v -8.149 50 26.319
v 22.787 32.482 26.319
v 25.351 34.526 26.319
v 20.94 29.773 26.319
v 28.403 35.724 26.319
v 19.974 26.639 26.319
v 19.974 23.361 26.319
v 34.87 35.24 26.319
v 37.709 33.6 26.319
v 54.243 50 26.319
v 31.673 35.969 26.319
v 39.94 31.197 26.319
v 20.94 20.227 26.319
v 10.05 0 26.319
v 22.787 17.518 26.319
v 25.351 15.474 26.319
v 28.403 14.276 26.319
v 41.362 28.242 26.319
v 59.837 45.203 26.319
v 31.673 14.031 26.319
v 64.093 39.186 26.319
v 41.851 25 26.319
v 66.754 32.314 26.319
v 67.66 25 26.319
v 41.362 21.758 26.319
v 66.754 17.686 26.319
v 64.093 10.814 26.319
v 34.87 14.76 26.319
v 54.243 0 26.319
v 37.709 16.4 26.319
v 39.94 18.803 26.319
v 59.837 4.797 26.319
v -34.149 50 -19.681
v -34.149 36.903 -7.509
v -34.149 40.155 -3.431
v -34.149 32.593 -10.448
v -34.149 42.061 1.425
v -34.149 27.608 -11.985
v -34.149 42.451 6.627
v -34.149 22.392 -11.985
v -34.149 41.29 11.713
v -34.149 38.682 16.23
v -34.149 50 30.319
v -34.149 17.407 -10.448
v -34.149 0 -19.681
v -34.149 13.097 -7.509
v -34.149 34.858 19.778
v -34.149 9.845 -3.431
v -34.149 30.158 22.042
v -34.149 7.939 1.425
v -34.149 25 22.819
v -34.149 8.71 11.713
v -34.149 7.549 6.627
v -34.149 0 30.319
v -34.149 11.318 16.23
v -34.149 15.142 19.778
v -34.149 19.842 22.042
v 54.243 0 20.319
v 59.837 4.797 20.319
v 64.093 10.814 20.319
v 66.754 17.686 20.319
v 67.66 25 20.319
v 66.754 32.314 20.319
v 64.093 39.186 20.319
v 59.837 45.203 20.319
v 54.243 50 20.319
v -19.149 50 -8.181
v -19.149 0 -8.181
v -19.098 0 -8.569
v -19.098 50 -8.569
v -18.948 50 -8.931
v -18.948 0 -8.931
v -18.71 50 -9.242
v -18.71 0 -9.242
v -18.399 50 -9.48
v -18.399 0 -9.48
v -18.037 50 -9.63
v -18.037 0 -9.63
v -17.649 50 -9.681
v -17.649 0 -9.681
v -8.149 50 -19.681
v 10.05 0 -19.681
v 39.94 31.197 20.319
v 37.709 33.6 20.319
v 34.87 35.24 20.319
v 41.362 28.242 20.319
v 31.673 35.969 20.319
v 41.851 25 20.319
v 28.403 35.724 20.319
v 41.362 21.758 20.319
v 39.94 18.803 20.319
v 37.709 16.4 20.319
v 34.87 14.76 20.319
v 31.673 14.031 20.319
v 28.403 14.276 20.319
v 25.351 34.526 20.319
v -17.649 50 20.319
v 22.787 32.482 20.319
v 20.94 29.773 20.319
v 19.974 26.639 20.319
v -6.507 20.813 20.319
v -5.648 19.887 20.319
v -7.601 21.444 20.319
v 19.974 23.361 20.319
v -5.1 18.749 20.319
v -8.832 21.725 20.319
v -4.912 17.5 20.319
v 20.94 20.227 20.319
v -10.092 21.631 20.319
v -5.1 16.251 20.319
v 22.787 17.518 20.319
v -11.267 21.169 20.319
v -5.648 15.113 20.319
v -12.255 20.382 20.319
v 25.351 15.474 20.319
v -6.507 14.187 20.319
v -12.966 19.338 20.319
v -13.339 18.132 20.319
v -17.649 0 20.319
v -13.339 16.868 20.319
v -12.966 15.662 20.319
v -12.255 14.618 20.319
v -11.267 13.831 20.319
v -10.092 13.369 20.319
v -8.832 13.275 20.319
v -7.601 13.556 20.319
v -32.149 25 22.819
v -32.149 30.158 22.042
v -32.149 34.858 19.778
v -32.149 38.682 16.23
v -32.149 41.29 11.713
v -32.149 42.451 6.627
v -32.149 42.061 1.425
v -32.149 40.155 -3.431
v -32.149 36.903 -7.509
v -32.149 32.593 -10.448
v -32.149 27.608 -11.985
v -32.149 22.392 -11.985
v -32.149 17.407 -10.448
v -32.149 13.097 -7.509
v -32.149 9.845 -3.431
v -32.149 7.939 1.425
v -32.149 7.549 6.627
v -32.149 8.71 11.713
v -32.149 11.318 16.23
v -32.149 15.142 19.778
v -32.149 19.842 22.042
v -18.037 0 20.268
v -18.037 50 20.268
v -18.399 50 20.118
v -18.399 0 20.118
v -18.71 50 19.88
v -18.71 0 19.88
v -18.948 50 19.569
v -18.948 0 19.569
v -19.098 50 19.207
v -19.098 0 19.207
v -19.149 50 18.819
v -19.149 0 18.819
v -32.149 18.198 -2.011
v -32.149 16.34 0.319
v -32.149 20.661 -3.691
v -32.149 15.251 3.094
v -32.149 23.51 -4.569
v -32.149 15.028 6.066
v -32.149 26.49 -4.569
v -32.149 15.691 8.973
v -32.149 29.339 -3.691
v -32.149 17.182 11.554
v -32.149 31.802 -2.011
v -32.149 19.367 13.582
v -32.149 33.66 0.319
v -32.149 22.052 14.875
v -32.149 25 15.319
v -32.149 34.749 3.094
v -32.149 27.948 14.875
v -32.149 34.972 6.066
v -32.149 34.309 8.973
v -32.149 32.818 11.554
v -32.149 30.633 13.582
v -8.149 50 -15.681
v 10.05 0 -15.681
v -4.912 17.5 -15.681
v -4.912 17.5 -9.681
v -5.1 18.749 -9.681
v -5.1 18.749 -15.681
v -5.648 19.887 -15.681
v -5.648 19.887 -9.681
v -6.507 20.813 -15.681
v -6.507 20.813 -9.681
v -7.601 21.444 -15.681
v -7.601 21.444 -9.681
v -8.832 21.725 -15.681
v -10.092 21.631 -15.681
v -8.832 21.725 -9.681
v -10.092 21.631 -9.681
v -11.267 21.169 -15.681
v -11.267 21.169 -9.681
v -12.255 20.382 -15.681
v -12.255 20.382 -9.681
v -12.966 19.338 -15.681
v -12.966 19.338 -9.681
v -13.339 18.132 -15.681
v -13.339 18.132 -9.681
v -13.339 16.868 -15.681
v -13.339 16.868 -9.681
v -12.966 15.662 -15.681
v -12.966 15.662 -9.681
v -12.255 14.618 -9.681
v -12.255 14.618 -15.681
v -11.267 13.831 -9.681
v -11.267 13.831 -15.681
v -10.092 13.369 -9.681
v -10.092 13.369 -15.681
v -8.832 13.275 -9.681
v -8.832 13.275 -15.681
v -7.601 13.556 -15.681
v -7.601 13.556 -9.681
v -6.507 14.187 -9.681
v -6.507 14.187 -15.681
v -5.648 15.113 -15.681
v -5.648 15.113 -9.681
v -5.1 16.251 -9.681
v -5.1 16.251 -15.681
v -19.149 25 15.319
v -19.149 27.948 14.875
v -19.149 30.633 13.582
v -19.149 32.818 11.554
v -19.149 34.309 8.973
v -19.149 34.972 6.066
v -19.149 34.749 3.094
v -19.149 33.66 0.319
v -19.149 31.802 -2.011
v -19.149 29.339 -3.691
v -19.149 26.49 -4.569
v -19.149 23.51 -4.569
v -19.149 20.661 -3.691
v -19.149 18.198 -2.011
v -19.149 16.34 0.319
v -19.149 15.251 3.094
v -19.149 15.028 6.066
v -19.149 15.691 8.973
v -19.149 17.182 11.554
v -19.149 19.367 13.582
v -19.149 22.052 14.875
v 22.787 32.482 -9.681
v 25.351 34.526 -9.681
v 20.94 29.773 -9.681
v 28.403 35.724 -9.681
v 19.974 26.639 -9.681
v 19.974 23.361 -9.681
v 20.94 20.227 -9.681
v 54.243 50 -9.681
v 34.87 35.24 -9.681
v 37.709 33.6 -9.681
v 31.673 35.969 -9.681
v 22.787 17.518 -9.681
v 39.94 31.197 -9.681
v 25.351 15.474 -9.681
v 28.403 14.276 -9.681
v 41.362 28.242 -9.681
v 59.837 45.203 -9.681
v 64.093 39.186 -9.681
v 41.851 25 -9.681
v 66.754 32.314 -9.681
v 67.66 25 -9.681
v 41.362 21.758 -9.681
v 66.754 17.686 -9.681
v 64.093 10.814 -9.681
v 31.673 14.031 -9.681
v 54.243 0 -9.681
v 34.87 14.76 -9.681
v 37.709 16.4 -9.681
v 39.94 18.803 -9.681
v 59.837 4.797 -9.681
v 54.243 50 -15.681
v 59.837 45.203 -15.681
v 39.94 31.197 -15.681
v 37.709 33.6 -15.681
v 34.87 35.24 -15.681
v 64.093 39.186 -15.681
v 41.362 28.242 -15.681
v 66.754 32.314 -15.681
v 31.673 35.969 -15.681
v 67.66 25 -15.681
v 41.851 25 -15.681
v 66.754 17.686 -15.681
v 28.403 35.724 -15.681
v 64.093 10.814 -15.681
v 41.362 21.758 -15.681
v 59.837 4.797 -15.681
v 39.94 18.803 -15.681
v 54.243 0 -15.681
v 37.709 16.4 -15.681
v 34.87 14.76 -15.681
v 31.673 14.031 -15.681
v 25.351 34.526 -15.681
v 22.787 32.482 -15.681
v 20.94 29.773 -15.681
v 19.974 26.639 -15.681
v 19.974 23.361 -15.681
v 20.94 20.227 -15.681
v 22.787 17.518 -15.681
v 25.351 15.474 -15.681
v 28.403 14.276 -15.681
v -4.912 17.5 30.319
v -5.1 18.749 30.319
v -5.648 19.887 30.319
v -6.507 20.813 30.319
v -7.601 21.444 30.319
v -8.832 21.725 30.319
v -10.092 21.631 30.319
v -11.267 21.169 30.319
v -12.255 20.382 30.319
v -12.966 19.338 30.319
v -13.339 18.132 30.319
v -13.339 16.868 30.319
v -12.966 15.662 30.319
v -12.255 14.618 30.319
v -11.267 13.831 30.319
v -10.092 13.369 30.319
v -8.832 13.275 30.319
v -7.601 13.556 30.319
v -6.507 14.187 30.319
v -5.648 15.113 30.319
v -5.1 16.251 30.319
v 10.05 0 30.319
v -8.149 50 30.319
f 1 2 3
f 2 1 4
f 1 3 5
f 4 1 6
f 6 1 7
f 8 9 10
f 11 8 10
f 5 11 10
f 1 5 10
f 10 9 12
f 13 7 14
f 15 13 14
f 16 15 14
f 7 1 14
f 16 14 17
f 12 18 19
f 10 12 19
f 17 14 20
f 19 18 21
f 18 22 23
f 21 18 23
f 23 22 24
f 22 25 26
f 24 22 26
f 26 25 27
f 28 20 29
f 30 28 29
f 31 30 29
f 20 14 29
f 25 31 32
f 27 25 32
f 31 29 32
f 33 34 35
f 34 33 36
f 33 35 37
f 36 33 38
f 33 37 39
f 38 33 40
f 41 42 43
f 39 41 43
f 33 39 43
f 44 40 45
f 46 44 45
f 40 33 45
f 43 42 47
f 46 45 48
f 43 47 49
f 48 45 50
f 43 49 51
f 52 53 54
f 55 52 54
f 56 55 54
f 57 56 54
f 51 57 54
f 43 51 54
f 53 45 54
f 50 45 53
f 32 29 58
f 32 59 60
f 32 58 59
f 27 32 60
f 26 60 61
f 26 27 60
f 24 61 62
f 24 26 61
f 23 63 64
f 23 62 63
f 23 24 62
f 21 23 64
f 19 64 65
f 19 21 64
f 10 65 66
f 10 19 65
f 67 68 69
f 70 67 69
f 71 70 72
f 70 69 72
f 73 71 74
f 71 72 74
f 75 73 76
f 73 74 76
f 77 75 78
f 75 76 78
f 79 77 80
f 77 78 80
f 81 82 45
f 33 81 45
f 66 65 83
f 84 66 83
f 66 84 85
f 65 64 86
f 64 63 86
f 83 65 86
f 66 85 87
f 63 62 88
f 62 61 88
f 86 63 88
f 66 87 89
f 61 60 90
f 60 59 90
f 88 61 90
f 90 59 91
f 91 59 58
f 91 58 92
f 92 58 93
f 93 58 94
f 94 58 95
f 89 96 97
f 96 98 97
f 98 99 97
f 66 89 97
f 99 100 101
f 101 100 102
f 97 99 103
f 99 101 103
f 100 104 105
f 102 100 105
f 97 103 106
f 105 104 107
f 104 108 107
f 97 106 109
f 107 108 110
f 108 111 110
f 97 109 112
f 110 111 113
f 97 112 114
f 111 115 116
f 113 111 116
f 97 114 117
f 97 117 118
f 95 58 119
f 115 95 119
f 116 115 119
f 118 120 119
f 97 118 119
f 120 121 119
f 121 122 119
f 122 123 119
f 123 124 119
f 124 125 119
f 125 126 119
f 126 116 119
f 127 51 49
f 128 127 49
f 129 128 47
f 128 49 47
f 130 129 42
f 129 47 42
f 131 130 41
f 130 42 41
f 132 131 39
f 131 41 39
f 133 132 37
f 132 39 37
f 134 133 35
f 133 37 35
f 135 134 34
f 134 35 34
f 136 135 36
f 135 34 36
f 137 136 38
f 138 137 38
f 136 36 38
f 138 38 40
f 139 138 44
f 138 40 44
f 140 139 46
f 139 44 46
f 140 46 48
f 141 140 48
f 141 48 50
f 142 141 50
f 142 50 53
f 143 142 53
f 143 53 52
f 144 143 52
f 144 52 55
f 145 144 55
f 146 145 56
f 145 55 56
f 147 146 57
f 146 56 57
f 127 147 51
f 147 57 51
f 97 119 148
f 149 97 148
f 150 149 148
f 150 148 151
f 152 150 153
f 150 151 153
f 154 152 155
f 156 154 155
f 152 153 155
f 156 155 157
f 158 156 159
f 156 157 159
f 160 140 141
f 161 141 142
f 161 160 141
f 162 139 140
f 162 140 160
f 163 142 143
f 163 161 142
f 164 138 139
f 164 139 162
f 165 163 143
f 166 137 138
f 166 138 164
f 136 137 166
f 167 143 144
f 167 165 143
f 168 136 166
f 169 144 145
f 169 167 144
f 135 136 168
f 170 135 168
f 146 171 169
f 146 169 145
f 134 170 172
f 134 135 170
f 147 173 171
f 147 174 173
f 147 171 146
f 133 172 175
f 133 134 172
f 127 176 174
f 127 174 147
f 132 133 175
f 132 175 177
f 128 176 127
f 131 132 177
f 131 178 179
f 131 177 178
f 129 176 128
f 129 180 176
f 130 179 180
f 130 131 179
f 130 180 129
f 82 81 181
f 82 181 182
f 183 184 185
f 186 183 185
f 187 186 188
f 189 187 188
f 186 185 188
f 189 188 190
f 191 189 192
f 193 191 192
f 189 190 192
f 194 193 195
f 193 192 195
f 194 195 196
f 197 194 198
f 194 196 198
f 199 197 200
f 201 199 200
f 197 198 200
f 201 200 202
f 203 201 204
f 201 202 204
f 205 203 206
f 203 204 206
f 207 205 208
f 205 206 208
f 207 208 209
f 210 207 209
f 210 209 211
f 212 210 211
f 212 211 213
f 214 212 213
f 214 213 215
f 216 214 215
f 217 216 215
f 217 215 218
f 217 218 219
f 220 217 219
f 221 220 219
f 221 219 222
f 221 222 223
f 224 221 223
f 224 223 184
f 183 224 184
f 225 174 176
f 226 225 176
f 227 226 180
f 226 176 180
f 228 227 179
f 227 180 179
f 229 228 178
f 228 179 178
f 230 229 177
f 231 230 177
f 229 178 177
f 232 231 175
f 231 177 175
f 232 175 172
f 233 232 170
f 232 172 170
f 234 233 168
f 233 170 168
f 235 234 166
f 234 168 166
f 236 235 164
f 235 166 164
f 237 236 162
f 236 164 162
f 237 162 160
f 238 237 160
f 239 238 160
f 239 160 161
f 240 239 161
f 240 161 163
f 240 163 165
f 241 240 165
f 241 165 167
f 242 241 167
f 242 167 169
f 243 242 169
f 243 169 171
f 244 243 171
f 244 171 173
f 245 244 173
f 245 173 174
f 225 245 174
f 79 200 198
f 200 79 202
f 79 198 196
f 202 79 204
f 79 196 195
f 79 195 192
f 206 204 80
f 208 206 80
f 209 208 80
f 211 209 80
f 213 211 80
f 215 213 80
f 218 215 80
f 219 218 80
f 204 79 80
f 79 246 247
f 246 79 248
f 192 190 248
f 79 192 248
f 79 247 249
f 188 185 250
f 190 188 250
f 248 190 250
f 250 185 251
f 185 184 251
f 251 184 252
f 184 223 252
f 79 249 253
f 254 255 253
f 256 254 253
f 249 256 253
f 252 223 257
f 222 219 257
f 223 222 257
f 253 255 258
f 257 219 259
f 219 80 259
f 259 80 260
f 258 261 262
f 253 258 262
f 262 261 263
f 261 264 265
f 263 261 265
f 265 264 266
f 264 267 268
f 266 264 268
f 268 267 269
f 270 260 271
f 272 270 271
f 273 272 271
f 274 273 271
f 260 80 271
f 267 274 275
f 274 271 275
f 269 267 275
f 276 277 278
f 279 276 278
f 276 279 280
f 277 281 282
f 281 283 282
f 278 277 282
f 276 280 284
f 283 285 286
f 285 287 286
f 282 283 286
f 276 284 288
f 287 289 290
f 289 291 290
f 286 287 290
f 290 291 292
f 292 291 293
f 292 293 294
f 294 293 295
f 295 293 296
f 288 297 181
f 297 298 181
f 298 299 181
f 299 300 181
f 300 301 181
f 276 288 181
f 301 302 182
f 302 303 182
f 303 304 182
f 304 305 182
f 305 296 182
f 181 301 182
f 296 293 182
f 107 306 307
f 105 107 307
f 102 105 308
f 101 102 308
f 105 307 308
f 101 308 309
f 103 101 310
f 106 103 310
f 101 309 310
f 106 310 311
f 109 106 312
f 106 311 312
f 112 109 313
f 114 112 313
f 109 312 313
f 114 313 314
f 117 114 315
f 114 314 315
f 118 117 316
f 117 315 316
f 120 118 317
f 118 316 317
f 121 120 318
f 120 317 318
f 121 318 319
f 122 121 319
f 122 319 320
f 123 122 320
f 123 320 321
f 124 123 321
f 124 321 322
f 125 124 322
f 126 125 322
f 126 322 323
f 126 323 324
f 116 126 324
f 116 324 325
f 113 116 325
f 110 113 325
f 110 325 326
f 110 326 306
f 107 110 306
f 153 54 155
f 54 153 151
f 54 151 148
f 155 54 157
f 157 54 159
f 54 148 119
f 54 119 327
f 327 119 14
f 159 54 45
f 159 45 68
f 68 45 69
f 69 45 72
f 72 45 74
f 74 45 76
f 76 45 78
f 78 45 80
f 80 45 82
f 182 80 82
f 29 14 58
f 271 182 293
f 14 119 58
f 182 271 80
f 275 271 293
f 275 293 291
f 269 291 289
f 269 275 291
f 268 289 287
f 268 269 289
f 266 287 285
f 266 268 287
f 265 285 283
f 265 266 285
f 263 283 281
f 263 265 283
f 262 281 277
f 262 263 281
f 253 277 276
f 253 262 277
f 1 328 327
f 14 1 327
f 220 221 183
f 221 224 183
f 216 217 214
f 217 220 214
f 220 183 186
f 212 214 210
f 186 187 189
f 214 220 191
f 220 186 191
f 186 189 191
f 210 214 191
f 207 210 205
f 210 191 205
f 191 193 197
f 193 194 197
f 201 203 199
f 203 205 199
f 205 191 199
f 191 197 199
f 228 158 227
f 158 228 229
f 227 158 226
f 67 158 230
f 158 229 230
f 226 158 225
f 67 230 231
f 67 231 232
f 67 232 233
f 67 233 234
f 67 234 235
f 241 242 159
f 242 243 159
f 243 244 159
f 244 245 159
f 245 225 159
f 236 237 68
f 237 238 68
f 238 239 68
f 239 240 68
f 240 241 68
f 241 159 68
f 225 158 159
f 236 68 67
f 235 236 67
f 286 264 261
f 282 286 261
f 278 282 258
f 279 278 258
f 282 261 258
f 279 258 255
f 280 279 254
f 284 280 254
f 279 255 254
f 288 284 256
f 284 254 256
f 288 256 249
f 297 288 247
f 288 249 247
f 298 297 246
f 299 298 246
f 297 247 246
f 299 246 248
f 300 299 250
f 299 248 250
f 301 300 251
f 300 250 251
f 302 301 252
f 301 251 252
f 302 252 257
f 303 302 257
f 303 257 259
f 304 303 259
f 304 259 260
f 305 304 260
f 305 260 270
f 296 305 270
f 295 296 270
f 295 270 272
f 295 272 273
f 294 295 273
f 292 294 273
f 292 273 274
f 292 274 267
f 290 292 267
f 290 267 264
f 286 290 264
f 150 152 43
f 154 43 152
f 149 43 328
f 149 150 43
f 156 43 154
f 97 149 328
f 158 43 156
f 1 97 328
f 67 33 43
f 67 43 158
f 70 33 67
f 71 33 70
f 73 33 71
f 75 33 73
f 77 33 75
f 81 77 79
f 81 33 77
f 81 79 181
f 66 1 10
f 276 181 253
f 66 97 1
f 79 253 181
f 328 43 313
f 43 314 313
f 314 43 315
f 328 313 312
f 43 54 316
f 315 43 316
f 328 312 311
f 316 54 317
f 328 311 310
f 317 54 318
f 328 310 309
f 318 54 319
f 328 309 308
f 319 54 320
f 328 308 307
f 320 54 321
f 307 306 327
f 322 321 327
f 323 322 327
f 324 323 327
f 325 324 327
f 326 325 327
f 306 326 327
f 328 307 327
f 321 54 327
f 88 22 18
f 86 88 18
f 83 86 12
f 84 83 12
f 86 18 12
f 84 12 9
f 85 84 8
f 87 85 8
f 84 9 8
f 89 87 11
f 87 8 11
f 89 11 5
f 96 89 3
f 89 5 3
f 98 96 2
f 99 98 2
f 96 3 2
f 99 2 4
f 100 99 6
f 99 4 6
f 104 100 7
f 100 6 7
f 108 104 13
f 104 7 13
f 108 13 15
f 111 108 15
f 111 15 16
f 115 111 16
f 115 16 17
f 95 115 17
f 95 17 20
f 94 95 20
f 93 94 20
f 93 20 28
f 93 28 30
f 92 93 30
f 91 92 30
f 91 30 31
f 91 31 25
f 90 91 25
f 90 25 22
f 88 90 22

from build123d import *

# Parameters (mm, degrees)
SALIENTE_EXTRUIR1_DEPTH = 50
CROQUIS3_R              = 17.5
CORTAR_EXTRUIR1_DEPTH   = 2
CROQUIS4_R              = 10
CORTAR_EXTRUIR2_DEPTH   = 25
CROQUIS5_R              = 11
CORTAR_EXTRUIR3_DEPTH   = 96.884399238
CORTAR_EXTRUIR4_DEPTH   = 96.884399238
CROQUIS7_R              = 2.5
SALIENTE_EXTRUIR6_DEPTH = 4
CORTAR_EXTRUIR6_DEPTH   = 4
CROQUIS10_R             = 4.23710426
CORTAR_EXTRUIR7_DEPTH   = 98.86632729
SALIENTE_EXTRUIR8_DEPTH = 4
CORTAR_EXTRUIR10_DEPTH  = 4


with BuildPart() as part:
    # Croquis2 → Saliente-Extruir1 (new body)
    with BuildSketch(Plane(origin=(0, 0, 0), x_dir=(1, 0, 0), z_dir=(0, 1, 0))):
        with BuildLine():
            Line((-34.14893617, 19.680851064), (-34.14893617, -30.319148936))
            Line((-34.14893617, -30.319148936), (0, -30.319148936))
            Line((0, -30.319148936), (0, -26.319148936))
            Line((0, -26.319148936), (67.659574468, -26.319148936))
            Line((67.659574468, -26.319148936), (67.659574468, -20.319148936))
            Line((67.659574468, -20.319148936), (-17.64893617, -20.319148936))
            ThreePointArc((-17.64893617, -20.319148936), (-18.709596342, -19.879809108), (-19.14893617, -18.819148936))
            Line((-19.14893617, -18.819148936), (-19.14893617, 8.180851064))
            ThreePointArc((-19.14893617, 8.180851064), (-18.709596342, 9.241511236), (-17.64893617, 9.680851064))
            Line((-17.64893617, 9.680851064), (67.659574468, 9.680851064))
            Line((67.659574468, 9.680851064), (67.659574468, 15.680851064))
            Line((67.659574468, 15.680851064), (0, 15.680851064))
            Line((0, 15.680851064), (0, 19.680851064))
            Line((0, 19.680851064), (-34.14893617, 19.680851064))
        make_face()
    extrude(amount=SALIENTE_EXTRUIR1_DEPTH)

    # Croquis3 → Cortar-Extruir1 (cut)
    with BuildSketch(Plane.ZY.offset(34.14893617)):
        with Locations((5.319148936, 25)):
            Circle(CROQUIS3_R)
    extrude(amount=-CORTAR_EXTRUIR1_DEPTH, mode=Mode.SUBTRACT)

    # Croquis4 → Cortar-Extruir2 (cut)
    with BuildSketch(Plane.ZY.offset(32.14893617)):
        with Locations((5.319148936, 25)):
            Circle(CROQUIS4_R)
    extrude(amount=-CORTAR_EXTRUIR2_DEPTH, mode=Mode.SUBTRACT)

    # Croquis5 → Cortar-Extruir3 (cut, through all)
    with BuildSketch(Plane.XY.offset(26.319148936)):
        with Locations((30.85106383, 25)):
            Circle(CROQUIS5_R)
    extrude(amount=-CORTAR_EXTRUIR3_DEPTH, mode=Mode.SUBTRACT)

    # Croquis6 → Cortar-Extruir4 (cut, through all)
    with BuildSketch(Plane.XY.offset(26.319148936)):
        with BuildLine():
            Line((75.592825188, 50), (75.592825188, 0))
            Line((75.592825188, 0), (54.24269842, 0))
            ThreePointArc((54.24269842, 0), (67.659574468, 25), (54.24269842, 50))
            Line((54.24269842, 50), (75.592825188, 50))
        make_face()
    extrude(amount=-CORTAR_EXTRUIR4_DEPTH, mode=Mode.SUBTRACT)

    # Croquis7 → Saliente-Extruir6 (add)
    with BuildSketch(Plane.XY.offset(30.319148936)):
        Polygon((-34.14893617, 50), (-8.14893617, 50), (10.049575543, 0), (-34.14893617, 0), align=None)
        with Locations((-9.14893617, 17.5)):
            Circle(CROQUIS7_R, mode=Mode.SUBTRACT)
    extrude(amount=-SALIENTE_EXTRUIR6_DEPTH)

    # Croquis8 → Cortar-Extruir6 (cut)
    with BuildSketch(Plane.XY.offset(30.319148936)):
        Polygon((0, 27.61098188), (-8.14893617, 50), (0, 50), align=None)
    extrude(amount=-CORTAR_EXTRUIR6_DEPTH, mode=Mode.SUBTRACT)

    # Croquis10 → Cortar-Extruir7 (cut, through all)
    with BuildSketch(Plane.XY.offset(30.319148936)):
        with Locations((-9.14893617, 17.5)):
            Circle(CROQUIS10_R)
    extrude(amount=-CORTAR_EXTRUIR7_DEPTH, mode=Mode.SUBTRACT)

    # Croquis11 → Saliente-Extruir8 (add)
    with BuildSketch(Plane(origin=(0, 0, -19.680851064), x_dir=(-1, 0, 0), z_dir=(0, 0, -1))):
        Polygon((8.14893617, 50), (-10.049575543, 0), (19.14893617, 0), (19.14893617, 50), align=None)
    extrude(amount=-SALIENTE_EXTRUIR8_DEPTH)

    # Croquis13 → Cortar-Extruir10 (cut)
    with BuildSketch(Plane(origin=(0, 0, -19.680851064), x_dir=(-1, 0, 0), z_dir=(0, 0, -1))):
        Polygon((0, 50), (0, 27.61098188), (8.14893617, 50), align=None)
    extrude(amount=-CORTAR_EXTRUIR10_DEPTH, mode=Mode.SUBTRACT)


solid = part.part
